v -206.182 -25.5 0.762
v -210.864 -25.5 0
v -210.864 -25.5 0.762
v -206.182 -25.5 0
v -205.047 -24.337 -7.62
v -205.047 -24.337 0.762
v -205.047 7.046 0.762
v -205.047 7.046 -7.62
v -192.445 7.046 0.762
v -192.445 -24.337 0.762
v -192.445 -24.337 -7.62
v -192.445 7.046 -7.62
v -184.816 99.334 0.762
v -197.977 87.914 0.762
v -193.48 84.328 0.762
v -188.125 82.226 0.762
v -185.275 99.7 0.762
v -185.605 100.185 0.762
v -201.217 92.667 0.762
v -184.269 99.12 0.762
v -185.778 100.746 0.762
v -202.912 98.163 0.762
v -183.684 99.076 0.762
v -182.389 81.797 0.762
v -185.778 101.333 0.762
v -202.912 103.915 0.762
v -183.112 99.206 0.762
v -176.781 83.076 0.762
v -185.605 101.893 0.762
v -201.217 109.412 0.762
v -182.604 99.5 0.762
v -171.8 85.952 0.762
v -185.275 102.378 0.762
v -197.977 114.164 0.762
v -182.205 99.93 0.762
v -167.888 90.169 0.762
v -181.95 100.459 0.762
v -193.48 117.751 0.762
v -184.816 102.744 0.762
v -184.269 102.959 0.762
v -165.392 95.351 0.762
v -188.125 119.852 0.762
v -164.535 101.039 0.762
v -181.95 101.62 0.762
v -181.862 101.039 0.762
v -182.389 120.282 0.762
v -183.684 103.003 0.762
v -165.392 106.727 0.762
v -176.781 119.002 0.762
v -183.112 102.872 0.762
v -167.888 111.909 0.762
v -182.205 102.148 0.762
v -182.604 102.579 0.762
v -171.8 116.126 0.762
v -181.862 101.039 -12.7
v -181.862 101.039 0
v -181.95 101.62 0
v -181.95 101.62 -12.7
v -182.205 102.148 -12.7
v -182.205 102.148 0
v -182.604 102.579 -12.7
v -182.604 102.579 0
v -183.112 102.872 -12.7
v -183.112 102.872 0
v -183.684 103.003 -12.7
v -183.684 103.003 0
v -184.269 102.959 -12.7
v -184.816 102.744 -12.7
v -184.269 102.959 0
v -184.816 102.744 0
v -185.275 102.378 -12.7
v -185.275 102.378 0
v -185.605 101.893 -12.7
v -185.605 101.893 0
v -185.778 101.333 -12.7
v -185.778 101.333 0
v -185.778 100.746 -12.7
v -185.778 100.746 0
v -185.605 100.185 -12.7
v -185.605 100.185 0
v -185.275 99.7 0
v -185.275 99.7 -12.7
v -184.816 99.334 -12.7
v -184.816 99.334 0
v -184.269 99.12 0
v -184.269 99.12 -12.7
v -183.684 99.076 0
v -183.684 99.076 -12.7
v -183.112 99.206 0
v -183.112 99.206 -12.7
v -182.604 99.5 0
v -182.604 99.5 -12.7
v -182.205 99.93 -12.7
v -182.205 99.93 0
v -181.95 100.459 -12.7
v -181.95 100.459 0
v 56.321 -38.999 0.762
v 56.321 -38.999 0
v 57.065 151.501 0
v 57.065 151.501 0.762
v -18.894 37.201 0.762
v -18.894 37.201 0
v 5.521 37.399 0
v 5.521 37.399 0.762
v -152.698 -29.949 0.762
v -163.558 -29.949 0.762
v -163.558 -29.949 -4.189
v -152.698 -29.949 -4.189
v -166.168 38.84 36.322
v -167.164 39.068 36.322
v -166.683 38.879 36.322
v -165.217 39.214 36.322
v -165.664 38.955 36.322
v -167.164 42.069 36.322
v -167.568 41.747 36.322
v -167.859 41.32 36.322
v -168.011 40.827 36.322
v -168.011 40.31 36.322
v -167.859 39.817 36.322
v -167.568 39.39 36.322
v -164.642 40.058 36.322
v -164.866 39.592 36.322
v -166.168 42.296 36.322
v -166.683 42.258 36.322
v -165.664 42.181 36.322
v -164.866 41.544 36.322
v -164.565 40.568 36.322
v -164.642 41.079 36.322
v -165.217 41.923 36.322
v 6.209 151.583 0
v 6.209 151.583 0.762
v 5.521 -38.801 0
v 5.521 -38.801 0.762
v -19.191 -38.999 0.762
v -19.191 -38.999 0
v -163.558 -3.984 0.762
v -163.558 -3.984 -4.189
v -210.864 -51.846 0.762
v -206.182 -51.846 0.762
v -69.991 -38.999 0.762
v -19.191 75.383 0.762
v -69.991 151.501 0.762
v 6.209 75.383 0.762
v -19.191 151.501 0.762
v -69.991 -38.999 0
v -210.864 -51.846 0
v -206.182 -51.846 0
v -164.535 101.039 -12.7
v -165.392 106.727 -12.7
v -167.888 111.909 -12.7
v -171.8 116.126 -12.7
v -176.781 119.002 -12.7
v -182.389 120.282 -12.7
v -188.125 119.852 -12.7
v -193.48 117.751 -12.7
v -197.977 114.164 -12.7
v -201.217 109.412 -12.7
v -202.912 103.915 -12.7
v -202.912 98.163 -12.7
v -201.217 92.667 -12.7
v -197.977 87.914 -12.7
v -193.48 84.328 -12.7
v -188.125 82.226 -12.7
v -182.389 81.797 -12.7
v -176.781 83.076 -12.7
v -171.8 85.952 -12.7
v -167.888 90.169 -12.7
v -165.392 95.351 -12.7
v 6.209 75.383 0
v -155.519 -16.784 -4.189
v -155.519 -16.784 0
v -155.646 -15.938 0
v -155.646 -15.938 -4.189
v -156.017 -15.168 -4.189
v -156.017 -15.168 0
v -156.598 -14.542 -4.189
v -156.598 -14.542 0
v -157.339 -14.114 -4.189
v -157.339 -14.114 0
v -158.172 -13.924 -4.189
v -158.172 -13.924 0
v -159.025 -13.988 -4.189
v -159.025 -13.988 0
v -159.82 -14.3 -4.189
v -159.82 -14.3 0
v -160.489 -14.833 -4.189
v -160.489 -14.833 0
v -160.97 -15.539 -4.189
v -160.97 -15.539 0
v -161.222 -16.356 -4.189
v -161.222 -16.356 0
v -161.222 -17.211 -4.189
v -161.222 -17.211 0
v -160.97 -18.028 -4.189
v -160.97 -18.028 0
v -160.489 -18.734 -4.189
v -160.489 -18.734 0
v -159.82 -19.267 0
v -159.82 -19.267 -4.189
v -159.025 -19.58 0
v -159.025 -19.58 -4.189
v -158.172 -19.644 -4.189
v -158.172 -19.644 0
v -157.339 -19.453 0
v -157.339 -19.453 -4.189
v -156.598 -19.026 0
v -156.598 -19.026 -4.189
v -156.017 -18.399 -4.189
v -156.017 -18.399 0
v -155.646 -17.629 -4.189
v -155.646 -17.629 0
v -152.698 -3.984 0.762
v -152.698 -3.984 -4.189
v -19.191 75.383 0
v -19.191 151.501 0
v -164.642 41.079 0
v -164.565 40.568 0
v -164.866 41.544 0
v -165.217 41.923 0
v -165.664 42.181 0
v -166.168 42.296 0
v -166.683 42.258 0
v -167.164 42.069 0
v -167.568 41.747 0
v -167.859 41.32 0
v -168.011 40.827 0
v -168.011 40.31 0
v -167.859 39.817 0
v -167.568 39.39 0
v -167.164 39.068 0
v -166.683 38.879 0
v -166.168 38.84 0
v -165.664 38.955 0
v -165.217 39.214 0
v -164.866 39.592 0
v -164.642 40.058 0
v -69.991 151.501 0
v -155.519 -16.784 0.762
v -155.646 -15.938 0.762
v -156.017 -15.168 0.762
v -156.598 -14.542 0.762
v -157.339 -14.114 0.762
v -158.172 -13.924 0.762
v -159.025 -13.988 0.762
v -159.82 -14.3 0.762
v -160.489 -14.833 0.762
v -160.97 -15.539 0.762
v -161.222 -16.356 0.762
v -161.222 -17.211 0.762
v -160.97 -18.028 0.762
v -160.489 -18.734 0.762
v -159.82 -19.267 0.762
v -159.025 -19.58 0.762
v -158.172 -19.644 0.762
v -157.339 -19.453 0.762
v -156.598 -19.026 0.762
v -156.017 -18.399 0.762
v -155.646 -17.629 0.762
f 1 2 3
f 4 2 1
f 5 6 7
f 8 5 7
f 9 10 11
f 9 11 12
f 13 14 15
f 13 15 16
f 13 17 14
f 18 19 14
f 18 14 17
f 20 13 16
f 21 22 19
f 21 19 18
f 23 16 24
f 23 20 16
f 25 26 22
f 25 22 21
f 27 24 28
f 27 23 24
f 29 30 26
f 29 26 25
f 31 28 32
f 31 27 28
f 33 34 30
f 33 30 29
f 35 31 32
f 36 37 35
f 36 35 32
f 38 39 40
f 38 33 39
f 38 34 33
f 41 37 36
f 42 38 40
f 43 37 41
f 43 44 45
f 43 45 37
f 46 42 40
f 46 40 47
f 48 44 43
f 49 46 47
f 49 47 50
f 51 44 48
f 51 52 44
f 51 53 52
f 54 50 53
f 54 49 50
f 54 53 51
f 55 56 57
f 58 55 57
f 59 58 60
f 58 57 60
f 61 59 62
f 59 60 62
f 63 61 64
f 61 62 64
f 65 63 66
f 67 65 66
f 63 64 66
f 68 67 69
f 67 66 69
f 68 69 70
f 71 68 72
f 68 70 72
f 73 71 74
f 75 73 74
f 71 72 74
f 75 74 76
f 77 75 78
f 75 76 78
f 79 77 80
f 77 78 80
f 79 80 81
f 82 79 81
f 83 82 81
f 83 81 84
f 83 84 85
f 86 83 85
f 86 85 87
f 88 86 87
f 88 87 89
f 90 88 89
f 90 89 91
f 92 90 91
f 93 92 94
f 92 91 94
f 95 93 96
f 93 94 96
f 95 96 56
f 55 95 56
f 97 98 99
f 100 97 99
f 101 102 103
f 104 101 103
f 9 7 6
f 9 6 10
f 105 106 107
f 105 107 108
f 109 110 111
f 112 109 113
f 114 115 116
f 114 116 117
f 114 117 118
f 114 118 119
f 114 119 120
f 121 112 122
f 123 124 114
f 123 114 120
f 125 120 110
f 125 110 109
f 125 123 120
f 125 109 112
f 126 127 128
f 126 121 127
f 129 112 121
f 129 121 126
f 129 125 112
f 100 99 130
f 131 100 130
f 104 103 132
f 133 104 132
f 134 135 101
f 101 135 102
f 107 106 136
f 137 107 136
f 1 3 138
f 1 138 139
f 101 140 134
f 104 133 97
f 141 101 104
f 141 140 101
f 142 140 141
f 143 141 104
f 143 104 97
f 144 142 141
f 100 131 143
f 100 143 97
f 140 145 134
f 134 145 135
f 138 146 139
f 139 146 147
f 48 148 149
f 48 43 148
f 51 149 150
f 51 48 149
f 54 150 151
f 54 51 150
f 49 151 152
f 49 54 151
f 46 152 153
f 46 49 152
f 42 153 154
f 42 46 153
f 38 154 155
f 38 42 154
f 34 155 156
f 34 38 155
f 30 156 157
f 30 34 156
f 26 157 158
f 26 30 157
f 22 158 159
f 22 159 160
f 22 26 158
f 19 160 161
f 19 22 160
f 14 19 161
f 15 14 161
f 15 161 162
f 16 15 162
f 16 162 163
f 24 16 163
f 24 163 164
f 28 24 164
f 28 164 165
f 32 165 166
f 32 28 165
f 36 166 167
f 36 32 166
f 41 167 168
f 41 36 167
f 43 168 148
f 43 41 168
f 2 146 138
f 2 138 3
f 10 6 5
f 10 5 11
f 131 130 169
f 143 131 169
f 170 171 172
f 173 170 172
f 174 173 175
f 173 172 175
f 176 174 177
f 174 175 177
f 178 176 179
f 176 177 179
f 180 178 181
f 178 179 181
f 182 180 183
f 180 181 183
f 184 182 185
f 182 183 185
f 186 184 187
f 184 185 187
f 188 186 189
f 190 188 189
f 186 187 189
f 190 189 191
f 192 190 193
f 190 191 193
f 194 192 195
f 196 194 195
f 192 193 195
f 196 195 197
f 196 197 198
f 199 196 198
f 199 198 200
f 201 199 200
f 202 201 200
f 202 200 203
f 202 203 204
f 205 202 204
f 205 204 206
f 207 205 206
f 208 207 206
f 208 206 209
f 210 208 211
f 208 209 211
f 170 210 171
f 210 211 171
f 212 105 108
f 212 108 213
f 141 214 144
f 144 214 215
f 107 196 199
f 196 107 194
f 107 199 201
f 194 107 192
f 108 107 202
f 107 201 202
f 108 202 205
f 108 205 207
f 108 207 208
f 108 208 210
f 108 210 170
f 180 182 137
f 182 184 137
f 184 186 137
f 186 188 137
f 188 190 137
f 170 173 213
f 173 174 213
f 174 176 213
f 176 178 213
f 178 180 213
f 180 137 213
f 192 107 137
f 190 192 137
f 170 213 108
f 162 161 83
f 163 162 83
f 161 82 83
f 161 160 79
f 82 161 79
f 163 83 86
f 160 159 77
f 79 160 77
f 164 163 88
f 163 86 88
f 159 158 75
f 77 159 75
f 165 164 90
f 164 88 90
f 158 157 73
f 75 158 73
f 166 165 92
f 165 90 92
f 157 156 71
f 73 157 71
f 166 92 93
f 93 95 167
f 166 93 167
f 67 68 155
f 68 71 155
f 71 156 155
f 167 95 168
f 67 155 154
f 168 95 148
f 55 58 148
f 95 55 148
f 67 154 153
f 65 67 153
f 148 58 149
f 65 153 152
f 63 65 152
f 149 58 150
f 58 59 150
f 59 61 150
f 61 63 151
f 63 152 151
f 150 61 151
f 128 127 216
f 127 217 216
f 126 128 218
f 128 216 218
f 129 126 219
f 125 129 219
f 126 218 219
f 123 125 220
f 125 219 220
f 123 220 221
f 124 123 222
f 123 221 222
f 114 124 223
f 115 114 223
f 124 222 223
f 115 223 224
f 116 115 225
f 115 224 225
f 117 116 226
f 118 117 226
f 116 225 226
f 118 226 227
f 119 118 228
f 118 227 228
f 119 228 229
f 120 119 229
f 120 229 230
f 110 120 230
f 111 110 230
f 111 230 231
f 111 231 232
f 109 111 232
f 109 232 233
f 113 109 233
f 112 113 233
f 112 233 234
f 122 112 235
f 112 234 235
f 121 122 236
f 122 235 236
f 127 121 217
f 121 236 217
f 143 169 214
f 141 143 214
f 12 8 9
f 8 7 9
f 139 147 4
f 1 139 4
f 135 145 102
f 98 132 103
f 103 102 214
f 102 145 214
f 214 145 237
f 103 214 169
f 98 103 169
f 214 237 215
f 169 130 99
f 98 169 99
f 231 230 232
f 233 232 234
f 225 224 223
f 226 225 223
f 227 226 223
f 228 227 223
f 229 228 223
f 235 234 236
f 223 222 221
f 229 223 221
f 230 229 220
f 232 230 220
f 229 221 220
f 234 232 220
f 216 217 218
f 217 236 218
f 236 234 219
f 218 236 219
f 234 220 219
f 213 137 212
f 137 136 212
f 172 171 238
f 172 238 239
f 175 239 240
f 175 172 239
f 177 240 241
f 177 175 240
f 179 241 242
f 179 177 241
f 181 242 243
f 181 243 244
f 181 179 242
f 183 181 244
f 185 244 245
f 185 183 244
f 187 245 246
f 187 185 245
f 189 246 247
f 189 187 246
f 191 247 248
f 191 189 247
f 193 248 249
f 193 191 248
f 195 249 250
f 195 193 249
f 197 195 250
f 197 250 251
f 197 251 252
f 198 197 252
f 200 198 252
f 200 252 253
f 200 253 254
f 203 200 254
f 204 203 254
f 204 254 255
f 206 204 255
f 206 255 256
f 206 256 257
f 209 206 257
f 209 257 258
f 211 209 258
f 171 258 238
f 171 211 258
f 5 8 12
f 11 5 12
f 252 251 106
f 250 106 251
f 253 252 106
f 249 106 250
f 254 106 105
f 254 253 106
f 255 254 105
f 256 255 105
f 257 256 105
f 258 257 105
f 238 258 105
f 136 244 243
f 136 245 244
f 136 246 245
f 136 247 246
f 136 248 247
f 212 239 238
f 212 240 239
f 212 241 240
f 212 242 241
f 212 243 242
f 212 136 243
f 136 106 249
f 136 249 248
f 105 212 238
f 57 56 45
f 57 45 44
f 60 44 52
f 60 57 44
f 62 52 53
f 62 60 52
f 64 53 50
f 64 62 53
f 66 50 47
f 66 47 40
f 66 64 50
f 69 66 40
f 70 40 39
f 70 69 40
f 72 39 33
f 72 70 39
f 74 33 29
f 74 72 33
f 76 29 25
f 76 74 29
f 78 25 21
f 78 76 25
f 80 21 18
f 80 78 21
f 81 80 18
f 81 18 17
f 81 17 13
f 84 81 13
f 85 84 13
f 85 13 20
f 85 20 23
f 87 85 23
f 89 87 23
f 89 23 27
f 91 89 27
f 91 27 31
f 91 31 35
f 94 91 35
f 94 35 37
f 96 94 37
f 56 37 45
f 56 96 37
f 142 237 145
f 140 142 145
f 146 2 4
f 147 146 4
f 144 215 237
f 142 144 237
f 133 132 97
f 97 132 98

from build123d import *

# Parameters (mm, degrees)
F1_DEPTH = 0.762
F0_R     = 1.7327110464
F0_R_2   = 19.2966279722
F0_R_3   = 1.9689175866
F0_W     = 10.8607709408
F0_H     = 25.9647709318
F0_R_4   = 2.8678942403
F0_W_2   = 12.6024335623
F0_H_2   = 31.3831828535
F0_W_3   = 4.6816319227
F0_H_3   = 26.3463743031
F2_DEPTH = 35.56
F3_DEPTH = 12.7
F4_DEPTH = 4.18935
F5_DEPTH = 7.62


with BuildPart() as f1:
    # F0 (on Top) → F1 (new body)
    with BuildSketch(Plane.XY):
        Polygon((-19.1911552637, 151.5007214869), (-69.9911552637, 151.5007214869), (-69.9911552637, -38.9992785131), (-19.1911552637, -38.9992785131), (-18.8935862653, 37.2007214869), (5.5206213845, 37.3991008191), (5.5206213845, -38.8008991809), (56.3206213845, -38.9992785131), (57.0645438804, 151.5007214869), (6.2088447363, 151.583313942), (6.2088447363, 75.383313942), (-19.1911552637, 75.383313942), align=None)
    extrude(amount=F1_DEPTH)


with BuildPart() as f1b:
    # F0 (on Top) → F1, piece 2 (new body)
    with BuildSketch(Plane.XY):
        with Locations((-166.2974655628, 40.5683033168)):
            Circle(F0_R)
    extrude(amount=F1_DEPTH)

    # F2 (add): a face of the model
    f2_faces = [f1b.faces().sort_by_distance(p)[0] for p in [
        (-166.2974655628, 40.5683033168, 0.762),
    ]]
    extrude(f2_faces, amount=F2_DEPTH)


with BuildPart() as f1c:
    # F0 (on Top) → F1, piece 3 (new body)
    with BuildSketch(Plane.XY):
        with Locations((-183.8313043118, 101.03918612)):
            Circle(F0_R_2)
        with Locations((-183.8313043118, 101.03918612)):
            Circle(F0_R_3, mode=Mode.SUBTRACT)
    extrude(amount=F1_DEPTH)

    # F3 (add): a face of the model
    f3_faces = [f1c.faces().sort_by_distance(p)[0] for p in [
        (-202.5821412242, 101.03918612, 0),
    ]]
    extrude(f3_faces, amount=F3_DEPTH)


with BuildPart() as f1d:
    # F0 (on Top) → F1, piece 4 (new body)
    with BuildSketch(Plane.XY):
        with Locations((-158.1279635429, -16.9666388538)):
            Rectangle(F0_W, F0_H)
        with Locations((-158.3865433931, -16.7837888002)):
            Circle(F0_R_4, mode=Mode.SUBTRACT)
    extrude(amount=F1_DEPTH)

    # F4 (add): a face of the model
    f4_faces = [f1d.faces().sort_by_distance(p)[0] for p in [
        (-163.2769017403, -16.9666388538, 0),
    ]]
    extrude(f4_faces, amount=F4_DEPTH)


with BuildPart() as f1e:
    # F0 (on Top) → F1, piece 5 (new body)
    with BuildSketch(Plane.XY):
        with Locations((-198.7462118268, -8.6456667632)):
            Rectangle(F0_W_2, F0_H_2)
    extrude(amount=F1_DEPTH)

    # F5 (add): a face of the model
    f5_faces = [f1e.faces().sort_by_distance(p)[0] for p in [
        (-198.7462118268, -8.6456667632, 0),
    ]]
    extrude(f5_faces, amount=F5_DEPTH)


with BuildPart() as f1f:
    # F0 (on Top) → F1, piece 6 (new body)
    with BuildSketch(Plane.XY):
        with Locations((-208.5229828954, -38.6727843434)):
            Rectangle(F0_W_3, F0_H_3)
    extrude(amount=F1_DEPTH)


solid = Compound([f1.part, f1b.part, f1c.part, f1d.part, f1e.part, f1f.part])
